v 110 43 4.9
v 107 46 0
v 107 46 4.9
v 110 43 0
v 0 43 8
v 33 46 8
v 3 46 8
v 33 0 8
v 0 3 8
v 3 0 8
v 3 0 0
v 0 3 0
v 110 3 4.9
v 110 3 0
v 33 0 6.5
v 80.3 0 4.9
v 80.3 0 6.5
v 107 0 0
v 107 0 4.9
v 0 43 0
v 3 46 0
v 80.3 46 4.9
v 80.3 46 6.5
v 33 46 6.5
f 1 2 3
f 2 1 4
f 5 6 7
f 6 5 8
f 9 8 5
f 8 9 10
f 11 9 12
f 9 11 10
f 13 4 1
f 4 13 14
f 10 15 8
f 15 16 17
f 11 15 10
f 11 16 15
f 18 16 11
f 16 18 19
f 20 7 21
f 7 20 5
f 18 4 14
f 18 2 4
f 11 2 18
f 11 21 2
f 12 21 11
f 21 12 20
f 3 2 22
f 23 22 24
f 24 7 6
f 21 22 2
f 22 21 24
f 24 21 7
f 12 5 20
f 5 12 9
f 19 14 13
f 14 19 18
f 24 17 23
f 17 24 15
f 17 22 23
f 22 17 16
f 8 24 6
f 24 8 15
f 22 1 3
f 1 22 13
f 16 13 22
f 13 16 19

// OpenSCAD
$fn = 32;

// ----------------------------------------------------------------------
// Stepped bar: twostep, 110 x 46 x 8/4.9 mm
// ----------------------------------------------------------------------

// --- parameters (mm) ---
bar_l = 110;              // bar length, X
bar_w = 46;               // bar width, Y
plate_t = 8;              // thickness of the thick zone, Z
thin_t = 4.9;             // thickness of the thin zone
corner_c = 3;             // corner chamfer of the bar
step_cut = 3.1;           // material removed from the thin zone
stair1_x = 33;            // position of the first stair
stair2_x = 80.3;          // position of the second stair
mid_t = 6.5;              // thickness of the middle zone
depth_1 = 1.5;            // depth of cut 1 from the top face
depth_2 = 3.1;            // depth of cut 2 from the top face

profile = [[3, 0], [107, 0], [110, 3], [110, 43], [107, 46], [3, 46], [0, 43], [0, 3]];  // primary outline, 8 points, counter clockwise
void_1 = [[33, -1], [80.3, -1], [80.3, 47], [33, 47]];  // first stair, 4 points
void_2 = [[80.3, -1], [111, -1], [111, 47], [80.3, 47]];  // second stair, 4 points

// --- the one profile operation ---
difference() {
  linear_extrude(height = plate_t) polygon(points = profile);
  translate([0, 0, plate_t - depth_1])
    linear_extrude(height = depth_1 + 1) polygon(points = void_1);
  translate([0, 0, plate_t - depth_2])
    linear_extrude(height = depth_2 + 1) polygon(points = void_2);
}
